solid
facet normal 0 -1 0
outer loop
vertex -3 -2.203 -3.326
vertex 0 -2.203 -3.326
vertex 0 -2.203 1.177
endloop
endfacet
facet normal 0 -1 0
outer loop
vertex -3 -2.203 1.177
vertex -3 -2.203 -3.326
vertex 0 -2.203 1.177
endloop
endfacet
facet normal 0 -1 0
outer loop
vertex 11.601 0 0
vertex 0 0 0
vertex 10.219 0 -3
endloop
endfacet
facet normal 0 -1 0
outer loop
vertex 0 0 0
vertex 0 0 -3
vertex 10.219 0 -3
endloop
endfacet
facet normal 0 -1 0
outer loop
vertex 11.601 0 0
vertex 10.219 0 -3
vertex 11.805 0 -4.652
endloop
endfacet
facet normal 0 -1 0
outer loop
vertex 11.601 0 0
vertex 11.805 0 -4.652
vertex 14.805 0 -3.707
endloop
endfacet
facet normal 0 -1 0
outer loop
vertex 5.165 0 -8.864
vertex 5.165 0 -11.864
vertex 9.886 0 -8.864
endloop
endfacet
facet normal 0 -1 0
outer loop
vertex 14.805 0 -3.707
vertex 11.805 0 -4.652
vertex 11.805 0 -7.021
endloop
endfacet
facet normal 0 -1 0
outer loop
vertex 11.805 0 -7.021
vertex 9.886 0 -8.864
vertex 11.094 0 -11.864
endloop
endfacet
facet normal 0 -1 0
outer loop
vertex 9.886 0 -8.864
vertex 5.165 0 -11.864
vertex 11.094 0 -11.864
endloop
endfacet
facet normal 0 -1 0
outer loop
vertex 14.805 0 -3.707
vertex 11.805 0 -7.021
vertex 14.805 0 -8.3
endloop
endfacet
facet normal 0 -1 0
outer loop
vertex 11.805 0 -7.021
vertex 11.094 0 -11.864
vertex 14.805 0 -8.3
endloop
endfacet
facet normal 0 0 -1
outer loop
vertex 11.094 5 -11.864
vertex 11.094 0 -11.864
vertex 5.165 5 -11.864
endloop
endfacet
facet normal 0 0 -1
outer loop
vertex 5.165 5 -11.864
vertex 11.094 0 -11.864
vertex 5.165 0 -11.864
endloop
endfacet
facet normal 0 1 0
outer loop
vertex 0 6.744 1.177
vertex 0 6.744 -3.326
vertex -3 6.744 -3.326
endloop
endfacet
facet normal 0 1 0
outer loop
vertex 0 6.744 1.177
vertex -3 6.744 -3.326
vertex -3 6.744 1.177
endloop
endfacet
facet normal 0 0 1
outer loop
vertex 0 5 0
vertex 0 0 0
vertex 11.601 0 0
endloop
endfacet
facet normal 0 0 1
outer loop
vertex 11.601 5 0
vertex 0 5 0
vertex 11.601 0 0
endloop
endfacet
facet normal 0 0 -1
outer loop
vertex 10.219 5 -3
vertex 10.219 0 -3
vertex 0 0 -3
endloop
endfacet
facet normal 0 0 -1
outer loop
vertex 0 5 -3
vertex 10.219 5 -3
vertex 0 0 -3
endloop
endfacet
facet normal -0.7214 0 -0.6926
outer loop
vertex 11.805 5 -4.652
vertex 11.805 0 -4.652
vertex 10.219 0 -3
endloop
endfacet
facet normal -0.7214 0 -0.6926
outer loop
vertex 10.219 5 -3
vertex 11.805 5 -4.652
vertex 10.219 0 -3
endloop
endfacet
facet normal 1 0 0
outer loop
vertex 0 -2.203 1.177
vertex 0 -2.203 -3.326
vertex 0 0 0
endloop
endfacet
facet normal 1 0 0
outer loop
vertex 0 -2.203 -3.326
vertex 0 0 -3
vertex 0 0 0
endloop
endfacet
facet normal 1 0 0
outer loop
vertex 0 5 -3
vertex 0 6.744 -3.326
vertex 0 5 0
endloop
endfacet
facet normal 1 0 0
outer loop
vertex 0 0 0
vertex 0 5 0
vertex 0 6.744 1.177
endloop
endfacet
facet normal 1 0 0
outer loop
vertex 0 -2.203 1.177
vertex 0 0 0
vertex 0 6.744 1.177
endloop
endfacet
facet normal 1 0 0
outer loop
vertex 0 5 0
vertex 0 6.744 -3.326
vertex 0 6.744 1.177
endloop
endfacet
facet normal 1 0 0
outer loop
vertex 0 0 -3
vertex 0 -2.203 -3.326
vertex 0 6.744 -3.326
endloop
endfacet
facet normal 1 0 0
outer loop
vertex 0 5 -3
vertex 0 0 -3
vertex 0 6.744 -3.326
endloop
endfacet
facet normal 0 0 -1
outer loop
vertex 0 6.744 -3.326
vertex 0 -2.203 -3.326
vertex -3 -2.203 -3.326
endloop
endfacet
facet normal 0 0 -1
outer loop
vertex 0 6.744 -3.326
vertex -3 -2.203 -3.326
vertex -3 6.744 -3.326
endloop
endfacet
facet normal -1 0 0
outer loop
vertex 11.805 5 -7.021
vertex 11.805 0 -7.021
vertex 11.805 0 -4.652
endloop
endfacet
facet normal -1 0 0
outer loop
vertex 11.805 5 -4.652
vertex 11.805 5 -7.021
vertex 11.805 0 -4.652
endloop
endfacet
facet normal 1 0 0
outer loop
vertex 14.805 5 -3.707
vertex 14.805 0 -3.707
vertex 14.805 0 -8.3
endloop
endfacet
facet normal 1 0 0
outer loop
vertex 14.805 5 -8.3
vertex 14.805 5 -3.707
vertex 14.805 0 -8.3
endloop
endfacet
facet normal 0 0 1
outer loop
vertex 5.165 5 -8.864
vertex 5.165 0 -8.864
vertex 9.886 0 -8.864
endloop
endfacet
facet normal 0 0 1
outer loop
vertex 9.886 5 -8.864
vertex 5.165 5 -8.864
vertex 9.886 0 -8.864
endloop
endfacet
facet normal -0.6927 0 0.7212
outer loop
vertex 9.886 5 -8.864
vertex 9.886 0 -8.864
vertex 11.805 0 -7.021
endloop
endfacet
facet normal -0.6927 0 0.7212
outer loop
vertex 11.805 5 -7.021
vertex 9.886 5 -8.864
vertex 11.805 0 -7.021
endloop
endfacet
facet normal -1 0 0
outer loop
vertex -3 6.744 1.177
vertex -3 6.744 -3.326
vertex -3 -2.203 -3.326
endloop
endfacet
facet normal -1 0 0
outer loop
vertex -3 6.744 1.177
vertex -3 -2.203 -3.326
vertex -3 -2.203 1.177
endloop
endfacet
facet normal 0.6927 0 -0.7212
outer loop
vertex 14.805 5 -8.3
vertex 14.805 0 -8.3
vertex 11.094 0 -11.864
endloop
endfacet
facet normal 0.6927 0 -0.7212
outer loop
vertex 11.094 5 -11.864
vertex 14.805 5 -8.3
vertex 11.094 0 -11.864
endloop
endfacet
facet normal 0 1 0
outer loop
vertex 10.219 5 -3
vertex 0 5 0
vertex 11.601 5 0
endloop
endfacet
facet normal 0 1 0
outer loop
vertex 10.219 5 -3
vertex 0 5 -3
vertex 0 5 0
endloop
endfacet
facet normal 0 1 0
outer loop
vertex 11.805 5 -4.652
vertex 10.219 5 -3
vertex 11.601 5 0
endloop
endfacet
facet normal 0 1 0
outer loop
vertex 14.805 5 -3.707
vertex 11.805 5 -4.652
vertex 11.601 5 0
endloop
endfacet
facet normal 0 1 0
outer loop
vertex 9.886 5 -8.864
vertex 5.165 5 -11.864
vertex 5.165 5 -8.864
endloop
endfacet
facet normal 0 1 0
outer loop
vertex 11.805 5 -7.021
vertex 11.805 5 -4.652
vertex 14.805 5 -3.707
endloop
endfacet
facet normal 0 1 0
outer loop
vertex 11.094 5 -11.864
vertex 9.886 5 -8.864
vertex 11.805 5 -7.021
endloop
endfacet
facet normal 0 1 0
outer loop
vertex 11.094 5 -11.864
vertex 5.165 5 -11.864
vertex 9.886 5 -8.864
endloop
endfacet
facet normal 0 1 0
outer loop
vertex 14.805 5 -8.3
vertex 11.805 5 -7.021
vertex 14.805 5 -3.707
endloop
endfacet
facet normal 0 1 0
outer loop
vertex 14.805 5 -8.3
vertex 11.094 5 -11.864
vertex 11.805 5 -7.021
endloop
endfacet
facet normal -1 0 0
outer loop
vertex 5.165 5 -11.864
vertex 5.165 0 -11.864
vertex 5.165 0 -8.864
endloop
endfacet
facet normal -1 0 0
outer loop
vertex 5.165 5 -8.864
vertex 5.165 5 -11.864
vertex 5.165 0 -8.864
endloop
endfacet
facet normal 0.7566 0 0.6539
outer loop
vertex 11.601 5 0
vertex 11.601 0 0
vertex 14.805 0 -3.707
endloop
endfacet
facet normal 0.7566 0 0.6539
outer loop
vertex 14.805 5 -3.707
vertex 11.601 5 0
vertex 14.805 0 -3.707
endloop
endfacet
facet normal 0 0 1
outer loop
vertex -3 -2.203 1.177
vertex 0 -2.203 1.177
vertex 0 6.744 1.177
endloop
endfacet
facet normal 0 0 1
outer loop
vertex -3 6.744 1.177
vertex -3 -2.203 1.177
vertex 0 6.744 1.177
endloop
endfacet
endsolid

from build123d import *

# Parameters (mm, degrees)
EXTRUDE_1_DEPTH = 5
SKETCH_2_W      = 4.503141041
SKETCH_2_H      = 8.946240201
EXTRUDE_2_DEPTH = 3


with BuildPart() as part:
    # Эскиз1 → Бобышка-Вытянуть1 (new body)
    with BuildSketch(Plane(origin=(0, 0, 0), x_dir=(1, 0, 0), z_dir=(0, 1, 0))):
        Polygon((0, 0), (11.600546573, 0), (14.80537201, 3.707393578), (14.80537201, 8.299672792), (11.09364712, 11.86425352), (5.164556962, 11.86425352), (5.164556962, 8.86425352), (9.886392586, 8.86425352), (11.80537201, 7.021348328), (11.80537201, 4.652272931), (10.218600246, 3), (0, 3), align=None)
    extrude(amount=EXTRUDE_1_DEPTH)

    # Эскиз2 → Бобышка-Вытянуть2 (add)
    with BuildSketch(Plane.ZY):
        with Locations((-1.074738625, 2.270579917)):
            Rectangle(SKETCH_2_W, SKETCH_2_H)
    extrude(amount=EXTRUDE_2_DEPTH)


solid = part.part
